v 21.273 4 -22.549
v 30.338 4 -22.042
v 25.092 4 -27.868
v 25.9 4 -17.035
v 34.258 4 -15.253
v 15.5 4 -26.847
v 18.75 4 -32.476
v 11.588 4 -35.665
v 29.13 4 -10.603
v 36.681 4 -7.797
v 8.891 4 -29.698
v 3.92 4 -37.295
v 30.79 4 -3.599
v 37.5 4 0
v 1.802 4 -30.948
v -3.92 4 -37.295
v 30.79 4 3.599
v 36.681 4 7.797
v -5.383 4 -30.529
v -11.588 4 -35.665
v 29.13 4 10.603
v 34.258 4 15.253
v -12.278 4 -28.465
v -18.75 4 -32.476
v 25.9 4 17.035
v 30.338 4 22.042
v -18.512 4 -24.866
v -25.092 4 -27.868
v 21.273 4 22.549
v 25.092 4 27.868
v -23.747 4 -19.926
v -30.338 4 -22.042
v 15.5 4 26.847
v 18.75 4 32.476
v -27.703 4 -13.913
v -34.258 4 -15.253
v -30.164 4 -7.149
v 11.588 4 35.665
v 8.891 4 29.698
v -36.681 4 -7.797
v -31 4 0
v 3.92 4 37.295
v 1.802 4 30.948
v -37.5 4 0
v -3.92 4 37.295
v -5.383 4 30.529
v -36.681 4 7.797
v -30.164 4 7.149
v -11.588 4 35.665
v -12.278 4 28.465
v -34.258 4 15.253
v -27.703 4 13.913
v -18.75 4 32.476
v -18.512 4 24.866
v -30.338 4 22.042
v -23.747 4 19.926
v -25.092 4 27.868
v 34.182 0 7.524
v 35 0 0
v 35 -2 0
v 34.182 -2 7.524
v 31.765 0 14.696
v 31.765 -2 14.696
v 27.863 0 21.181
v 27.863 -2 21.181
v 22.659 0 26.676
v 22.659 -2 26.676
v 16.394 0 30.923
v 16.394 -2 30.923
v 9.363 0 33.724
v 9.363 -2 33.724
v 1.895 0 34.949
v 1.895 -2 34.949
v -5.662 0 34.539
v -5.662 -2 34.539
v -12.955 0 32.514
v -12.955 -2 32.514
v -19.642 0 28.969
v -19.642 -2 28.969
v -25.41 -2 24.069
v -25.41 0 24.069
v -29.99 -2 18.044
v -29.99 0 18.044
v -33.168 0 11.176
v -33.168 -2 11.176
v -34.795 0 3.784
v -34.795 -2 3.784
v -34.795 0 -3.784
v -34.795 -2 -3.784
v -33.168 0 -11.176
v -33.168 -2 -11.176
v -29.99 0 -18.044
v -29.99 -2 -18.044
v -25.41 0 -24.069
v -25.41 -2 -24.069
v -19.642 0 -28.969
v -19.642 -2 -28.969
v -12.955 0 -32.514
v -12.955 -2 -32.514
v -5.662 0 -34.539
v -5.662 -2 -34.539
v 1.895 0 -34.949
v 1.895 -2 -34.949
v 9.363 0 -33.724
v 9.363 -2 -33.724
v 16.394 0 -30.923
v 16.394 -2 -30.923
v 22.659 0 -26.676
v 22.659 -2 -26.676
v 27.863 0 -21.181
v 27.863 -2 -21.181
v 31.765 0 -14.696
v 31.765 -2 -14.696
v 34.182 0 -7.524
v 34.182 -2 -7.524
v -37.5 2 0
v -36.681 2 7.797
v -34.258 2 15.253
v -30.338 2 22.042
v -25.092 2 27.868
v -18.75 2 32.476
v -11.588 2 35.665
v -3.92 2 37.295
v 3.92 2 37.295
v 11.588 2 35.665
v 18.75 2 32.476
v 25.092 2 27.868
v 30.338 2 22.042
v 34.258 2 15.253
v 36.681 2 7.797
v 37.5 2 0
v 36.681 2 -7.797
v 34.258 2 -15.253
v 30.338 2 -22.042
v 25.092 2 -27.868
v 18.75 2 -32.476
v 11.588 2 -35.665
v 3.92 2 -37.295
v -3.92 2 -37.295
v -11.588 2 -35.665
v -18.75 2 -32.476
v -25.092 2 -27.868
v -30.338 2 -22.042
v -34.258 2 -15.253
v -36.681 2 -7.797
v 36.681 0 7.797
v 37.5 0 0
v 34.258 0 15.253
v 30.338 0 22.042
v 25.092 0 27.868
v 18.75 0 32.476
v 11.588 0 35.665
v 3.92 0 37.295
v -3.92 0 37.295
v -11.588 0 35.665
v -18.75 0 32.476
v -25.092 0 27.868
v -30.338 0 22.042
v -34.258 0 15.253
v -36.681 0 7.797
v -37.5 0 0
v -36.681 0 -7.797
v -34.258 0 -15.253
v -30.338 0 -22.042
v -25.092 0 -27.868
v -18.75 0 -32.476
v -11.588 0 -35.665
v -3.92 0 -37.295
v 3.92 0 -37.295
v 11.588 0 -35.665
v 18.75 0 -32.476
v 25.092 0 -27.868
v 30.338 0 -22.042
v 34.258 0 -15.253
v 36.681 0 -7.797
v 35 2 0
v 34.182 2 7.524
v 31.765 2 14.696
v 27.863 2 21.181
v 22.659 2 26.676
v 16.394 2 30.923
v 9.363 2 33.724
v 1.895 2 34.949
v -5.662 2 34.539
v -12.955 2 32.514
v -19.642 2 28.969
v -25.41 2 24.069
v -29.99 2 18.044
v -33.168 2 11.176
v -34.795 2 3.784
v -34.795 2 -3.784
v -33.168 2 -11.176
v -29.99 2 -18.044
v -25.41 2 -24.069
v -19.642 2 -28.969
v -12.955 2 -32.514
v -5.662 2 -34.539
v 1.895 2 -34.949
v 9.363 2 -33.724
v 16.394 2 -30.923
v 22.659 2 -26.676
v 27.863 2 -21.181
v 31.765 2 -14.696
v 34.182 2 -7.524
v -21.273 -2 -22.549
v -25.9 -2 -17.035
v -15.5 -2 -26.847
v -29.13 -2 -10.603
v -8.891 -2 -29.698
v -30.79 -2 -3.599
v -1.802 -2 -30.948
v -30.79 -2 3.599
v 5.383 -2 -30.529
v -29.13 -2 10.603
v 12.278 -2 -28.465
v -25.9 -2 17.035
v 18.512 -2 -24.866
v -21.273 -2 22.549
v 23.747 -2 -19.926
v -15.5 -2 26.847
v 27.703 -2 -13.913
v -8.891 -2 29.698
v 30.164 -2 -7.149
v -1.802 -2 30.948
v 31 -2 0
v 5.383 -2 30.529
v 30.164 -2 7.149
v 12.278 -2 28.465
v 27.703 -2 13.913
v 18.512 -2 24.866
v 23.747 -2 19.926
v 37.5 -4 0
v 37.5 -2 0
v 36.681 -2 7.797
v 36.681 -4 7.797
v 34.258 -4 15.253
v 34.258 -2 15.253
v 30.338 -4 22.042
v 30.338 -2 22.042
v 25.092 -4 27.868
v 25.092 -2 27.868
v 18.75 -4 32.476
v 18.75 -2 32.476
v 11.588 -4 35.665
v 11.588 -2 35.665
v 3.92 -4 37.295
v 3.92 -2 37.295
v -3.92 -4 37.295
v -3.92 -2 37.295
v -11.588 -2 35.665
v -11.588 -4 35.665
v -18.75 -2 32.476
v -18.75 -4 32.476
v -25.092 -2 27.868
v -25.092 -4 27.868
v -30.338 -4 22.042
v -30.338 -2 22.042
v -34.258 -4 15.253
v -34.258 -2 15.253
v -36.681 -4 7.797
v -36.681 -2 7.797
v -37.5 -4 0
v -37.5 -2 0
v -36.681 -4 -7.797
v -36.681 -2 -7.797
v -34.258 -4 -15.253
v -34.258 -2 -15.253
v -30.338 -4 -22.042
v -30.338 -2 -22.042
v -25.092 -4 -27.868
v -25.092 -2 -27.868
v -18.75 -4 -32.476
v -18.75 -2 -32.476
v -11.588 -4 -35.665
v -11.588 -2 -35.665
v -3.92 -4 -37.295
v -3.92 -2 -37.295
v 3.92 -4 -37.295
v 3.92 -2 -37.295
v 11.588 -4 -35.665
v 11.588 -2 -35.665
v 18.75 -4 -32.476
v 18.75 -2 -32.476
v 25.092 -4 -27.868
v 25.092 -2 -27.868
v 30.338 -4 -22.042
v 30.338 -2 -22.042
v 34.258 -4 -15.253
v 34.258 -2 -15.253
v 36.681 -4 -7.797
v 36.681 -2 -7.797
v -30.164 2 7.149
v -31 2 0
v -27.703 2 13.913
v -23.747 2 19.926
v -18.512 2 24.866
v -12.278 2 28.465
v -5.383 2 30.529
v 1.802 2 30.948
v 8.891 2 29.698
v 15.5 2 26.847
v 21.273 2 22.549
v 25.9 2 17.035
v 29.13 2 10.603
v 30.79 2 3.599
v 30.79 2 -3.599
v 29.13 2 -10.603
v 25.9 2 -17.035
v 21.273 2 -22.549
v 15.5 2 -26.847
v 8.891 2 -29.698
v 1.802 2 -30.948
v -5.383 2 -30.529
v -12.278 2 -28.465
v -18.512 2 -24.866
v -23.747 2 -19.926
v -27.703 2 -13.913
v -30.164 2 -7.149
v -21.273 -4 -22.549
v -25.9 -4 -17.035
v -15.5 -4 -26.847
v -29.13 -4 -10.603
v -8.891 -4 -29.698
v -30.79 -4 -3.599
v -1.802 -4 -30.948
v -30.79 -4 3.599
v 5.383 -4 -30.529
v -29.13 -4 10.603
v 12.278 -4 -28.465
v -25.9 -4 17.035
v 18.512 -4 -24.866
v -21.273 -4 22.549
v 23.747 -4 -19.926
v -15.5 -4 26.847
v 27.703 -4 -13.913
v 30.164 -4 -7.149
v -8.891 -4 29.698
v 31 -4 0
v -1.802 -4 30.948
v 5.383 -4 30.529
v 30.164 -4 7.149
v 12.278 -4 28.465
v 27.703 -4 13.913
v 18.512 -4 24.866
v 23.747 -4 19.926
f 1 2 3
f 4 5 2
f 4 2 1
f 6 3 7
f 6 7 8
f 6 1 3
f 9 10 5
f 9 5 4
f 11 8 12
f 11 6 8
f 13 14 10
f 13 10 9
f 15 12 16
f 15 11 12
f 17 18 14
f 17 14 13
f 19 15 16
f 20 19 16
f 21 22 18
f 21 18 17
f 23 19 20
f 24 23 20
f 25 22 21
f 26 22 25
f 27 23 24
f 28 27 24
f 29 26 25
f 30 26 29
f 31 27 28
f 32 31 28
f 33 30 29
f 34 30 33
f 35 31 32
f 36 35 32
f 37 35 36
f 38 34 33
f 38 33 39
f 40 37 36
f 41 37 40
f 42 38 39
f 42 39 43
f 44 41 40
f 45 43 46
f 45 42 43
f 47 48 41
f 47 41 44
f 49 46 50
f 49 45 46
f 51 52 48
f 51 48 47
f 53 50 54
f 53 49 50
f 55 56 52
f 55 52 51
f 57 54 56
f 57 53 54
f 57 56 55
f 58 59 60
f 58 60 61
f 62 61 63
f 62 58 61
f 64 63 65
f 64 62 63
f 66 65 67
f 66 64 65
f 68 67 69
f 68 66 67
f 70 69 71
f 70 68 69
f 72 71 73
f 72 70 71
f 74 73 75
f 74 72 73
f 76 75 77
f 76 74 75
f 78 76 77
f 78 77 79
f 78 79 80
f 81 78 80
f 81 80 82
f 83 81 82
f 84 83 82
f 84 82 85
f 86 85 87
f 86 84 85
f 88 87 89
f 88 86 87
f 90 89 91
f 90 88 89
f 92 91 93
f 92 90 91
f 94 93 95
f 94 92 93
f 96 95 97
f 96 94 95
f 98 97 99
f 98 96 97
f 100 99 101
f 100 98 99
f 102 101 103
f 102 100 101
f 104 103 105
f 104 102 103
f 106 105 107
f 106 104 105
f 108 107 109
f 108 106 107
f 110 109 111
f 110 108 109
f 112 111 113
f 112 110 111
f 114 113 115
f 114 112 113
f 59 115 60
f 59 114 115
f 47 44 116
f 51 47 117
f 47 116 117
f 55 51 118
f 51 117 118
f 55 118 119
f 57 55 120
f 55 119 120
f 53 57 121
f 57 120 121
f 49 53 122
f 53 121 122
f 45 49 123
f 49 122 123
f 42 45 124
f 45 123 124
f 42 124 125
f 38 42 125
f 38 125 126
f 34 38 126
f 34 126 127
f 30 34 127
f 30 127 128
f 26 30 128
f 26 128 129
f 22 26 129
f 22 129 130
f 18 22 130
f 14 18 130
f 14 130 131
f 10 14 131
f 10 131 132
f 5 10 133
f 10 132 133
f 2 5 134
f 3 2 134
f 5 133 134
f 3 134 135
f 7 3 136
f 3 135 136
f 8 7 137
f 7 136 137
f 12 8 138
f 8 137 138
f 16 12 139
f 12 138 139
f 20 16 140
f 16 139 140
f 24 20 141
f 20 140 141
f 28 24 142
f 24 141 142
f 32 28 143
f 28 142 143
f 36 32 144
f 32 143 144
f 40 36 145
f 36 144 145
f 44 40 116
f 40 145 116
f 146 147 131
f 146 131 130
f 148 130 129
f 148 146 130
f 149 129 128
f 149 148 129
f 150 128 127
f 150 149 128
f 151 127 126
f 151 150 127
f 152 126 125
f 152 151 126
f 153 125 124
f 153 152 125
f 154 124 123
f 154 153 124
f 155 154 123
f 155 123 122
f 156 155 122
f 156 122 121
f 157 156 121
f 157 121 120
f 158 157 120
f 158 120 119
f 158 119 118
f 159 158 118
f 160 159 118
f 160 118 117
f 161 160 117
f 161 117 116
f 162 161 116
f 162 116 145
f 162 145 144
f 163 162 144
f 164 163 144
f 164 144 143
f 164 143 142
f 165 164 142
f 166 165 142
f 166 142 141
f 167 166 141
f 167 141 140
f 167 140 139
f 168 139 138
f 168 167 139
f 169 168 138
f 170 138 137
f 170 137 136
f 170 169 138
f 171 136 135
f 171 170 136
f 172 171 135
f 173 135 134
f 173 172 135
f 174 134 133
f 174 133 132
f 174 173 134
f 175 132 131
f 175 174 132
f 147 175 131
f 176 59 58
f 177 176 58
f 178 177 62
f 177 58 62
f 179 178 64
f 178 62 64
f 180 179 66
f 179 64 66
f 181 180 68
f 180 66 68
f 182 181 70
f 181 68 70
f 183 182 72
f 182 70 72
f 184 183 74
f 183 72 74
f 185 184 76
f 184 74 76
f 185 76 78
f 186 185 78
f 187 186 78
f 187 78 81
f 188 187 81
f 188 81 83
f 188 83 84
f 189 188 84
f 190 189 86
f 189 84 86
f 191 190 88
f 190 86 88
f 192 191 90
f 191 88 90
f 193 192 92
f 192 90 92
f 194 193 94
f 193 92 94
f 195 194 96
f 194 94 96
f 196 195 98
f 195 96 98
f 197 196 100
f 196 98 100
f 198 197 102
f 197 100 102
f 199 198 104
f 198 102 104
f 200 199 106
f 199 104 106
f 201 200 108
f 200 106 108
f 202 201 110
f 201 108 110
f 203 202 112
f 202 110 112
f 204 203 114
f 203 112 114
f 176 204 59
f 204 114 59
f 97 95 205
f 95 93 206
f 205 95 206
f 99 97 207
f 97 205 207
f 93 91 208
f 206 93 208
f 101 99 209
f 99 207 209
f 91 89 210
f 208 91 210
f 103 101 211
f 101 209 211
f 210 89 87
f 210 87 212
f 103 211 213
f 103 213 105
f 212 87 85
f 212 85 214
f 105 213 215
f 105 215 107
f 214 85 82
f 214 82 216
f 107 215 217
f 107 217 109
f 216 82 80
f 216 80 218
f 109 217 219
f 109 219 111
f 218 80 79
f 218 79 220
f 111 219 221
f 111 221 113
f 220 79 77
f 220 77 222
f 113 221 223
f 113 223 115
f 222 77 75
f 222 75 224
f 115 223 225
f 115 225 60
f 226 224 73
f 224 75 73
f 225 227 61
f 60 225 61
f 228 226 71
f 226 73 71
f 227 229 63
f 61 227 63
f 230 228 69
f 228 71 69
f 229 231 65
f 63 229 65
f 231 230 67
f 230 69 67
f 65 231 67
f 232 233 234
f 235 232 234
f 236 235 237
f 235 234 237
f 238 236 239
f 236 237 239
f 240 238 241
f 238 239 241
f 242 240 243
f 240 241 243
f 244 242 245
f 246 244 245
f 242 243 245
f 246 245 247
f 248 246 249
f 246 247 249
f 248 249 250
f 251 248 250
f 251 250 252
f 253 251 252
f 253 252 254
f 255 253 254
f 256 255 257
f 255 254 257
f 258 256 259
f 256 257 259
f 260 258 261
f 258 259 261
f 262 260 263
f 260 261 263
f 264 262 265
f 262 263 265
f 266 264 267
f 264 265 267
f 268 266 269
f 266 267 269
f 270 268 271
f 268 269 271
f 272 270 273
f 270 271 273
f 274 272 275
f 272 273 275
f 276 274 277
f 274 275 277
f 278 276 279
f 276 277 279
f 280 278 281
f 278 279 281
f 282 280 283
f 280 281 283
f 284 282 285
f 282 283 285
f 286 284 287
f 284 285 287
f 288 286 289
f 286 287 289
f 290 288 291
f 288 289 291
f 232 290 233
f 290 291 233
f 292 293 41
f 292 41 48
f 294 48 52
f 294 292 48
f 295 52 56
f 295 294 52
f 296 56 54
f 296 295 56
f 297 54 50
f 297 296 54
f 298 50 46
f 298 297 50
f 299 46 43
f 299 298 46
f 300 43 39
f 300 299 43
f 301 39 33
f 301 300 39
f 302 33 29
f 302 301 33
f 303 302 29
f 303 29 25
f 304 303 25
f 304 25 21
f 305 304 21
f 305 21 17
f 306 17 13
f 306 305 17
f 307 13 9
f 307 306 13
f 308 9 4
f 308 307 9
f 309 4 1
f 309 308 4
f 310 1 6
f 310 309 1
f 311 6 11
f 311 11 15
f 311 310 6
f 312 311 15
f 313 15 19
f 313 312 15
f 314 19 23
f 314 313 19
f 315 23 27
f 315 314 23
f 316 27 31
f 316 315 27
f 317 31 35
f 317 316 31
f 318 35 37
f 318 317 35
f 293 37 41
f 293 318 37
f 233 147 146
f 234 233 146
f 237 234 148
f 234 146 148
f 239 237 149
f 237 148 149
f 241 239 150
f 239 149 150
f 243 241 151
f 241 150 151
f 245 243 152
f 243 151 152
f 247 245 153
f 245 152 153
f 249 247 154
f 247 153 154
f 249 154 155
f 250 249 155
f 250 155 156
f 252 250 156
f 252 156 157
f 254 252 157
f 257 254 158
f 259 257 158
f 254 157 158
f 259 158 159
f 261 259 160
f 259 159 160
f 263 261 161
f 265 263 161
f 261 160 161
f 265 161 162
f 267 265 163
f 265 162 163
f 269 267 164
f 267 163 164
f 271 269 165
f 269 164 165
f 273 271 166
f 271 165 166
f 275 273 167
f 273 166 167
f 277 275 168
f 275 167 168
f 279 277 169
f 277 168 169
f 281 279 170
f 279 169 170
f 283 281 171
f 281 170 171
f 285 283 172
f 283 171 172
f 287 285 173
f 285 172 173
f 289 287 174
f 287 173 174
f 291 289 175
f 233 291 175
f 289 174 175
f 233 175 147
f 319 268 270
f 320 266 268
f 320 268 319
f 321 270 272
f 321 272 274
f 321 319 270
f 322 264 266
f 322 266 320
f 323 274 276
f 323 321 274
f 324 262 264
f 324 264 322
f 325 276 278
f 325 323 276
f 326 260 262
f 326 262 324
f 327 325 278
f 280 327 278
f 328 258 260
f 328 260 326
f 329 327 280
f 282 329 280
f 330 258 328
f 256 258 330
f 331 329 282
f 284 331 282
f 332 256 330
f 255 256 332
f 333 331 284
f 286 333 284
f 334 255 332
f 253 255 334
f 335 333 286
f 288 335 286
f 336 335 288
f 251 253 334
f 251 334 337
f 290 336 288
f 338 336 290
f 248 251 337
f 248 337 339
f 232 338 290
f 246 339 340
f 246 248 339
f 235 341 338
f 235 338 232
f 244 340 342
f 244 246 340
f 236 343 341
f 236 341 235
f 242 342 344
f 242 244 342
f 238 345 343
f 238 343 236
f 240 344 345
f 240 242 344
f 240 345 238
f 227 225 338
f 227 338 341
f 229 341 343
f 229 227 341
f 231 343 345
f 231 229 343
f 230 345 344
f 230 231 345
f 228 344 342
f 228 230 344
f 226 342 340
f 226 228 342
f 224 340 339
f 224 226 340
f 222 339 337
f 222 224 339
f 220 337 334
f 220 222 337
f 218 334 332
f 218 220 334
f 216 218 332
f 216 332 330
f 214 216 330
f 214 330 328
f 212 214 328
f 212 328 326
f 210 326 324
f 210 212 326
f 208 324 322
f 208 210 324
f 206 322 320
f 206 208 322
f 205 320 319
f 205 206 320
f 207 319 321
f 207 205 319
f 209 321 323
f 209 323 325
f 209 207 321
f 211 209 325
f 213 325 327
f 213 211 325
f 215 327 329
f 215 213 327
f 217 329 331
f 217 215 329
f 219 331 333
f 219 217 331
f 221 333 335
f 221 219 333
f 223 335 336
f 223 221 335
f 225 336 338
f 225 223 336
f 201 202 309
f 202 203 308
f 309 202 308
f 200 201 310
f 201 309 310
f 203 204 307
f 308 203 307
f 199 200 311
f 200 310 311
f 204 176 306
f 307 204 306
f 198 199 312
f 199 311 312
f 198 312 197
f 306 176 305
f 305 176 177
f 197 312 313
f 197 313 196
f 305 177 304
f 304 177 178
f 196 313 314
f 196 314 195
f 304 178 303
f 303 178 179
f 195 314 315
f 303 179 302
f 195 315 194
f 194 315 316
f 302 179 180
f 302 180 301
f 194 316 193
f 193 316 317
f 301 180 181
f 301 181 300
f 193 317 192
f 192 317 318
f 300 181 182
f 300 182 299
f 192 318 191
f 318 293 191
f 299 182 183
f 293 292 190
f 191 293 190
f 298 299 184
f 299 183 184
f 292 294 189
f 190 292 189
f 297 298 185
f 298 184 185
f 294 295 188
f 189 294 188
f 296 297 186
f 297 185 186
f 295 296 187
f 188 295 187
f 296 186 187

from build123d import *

# Parameters (mm, degrees)
F0_R          = 37.5
F0_R_2        = 35
F1_DEPTH      = 2
F1_DEPTH_BACK = 2
F2_R          = 37.5
F2_R_2        = 31
F3_DEPTH      = 2
F4_R          = 37.5
F4_R_2        = 31
F5_DEPTH      = 2


# Not quite as in the source:
# - a feature names something its author has since deleted; it is built from what else it names


with BuildPart() as f1:
    # F0 (on Front) → F1 (new body, two sides)
    with BuildSketch(Plane.XZ) as f1_sk:
        Circle(F0_R)
        Circle(F0_R_2, mode=Mode.SUBTRACT)
    extrude(amount=-F1_DEPTH)
    extrude(f1_sk.sketch, amount=F1_DEPTH_BACK)

    # F2 (on face) → F3 (join)
    with BuildSketch(Plane.XZ.offset(2)):
        Circle(F2_R)
        Circle(F2_R_2, mode=Mode.SUBTRACT)
    extrude(amount=F3_DEPTH)

    # F4 (on face) → F5 (join)
    with BuildSketch(Plane(origin=(0, 2, 0), x_dir=(-1, 0, 0), z_dir=(0, 1, 0))):
        Circle(F4_R)
        Circle(F4_R_2, mode=Mode.SUBTRACT)
    extrude(amount=F5_DEPTH)


solid = f1.part
